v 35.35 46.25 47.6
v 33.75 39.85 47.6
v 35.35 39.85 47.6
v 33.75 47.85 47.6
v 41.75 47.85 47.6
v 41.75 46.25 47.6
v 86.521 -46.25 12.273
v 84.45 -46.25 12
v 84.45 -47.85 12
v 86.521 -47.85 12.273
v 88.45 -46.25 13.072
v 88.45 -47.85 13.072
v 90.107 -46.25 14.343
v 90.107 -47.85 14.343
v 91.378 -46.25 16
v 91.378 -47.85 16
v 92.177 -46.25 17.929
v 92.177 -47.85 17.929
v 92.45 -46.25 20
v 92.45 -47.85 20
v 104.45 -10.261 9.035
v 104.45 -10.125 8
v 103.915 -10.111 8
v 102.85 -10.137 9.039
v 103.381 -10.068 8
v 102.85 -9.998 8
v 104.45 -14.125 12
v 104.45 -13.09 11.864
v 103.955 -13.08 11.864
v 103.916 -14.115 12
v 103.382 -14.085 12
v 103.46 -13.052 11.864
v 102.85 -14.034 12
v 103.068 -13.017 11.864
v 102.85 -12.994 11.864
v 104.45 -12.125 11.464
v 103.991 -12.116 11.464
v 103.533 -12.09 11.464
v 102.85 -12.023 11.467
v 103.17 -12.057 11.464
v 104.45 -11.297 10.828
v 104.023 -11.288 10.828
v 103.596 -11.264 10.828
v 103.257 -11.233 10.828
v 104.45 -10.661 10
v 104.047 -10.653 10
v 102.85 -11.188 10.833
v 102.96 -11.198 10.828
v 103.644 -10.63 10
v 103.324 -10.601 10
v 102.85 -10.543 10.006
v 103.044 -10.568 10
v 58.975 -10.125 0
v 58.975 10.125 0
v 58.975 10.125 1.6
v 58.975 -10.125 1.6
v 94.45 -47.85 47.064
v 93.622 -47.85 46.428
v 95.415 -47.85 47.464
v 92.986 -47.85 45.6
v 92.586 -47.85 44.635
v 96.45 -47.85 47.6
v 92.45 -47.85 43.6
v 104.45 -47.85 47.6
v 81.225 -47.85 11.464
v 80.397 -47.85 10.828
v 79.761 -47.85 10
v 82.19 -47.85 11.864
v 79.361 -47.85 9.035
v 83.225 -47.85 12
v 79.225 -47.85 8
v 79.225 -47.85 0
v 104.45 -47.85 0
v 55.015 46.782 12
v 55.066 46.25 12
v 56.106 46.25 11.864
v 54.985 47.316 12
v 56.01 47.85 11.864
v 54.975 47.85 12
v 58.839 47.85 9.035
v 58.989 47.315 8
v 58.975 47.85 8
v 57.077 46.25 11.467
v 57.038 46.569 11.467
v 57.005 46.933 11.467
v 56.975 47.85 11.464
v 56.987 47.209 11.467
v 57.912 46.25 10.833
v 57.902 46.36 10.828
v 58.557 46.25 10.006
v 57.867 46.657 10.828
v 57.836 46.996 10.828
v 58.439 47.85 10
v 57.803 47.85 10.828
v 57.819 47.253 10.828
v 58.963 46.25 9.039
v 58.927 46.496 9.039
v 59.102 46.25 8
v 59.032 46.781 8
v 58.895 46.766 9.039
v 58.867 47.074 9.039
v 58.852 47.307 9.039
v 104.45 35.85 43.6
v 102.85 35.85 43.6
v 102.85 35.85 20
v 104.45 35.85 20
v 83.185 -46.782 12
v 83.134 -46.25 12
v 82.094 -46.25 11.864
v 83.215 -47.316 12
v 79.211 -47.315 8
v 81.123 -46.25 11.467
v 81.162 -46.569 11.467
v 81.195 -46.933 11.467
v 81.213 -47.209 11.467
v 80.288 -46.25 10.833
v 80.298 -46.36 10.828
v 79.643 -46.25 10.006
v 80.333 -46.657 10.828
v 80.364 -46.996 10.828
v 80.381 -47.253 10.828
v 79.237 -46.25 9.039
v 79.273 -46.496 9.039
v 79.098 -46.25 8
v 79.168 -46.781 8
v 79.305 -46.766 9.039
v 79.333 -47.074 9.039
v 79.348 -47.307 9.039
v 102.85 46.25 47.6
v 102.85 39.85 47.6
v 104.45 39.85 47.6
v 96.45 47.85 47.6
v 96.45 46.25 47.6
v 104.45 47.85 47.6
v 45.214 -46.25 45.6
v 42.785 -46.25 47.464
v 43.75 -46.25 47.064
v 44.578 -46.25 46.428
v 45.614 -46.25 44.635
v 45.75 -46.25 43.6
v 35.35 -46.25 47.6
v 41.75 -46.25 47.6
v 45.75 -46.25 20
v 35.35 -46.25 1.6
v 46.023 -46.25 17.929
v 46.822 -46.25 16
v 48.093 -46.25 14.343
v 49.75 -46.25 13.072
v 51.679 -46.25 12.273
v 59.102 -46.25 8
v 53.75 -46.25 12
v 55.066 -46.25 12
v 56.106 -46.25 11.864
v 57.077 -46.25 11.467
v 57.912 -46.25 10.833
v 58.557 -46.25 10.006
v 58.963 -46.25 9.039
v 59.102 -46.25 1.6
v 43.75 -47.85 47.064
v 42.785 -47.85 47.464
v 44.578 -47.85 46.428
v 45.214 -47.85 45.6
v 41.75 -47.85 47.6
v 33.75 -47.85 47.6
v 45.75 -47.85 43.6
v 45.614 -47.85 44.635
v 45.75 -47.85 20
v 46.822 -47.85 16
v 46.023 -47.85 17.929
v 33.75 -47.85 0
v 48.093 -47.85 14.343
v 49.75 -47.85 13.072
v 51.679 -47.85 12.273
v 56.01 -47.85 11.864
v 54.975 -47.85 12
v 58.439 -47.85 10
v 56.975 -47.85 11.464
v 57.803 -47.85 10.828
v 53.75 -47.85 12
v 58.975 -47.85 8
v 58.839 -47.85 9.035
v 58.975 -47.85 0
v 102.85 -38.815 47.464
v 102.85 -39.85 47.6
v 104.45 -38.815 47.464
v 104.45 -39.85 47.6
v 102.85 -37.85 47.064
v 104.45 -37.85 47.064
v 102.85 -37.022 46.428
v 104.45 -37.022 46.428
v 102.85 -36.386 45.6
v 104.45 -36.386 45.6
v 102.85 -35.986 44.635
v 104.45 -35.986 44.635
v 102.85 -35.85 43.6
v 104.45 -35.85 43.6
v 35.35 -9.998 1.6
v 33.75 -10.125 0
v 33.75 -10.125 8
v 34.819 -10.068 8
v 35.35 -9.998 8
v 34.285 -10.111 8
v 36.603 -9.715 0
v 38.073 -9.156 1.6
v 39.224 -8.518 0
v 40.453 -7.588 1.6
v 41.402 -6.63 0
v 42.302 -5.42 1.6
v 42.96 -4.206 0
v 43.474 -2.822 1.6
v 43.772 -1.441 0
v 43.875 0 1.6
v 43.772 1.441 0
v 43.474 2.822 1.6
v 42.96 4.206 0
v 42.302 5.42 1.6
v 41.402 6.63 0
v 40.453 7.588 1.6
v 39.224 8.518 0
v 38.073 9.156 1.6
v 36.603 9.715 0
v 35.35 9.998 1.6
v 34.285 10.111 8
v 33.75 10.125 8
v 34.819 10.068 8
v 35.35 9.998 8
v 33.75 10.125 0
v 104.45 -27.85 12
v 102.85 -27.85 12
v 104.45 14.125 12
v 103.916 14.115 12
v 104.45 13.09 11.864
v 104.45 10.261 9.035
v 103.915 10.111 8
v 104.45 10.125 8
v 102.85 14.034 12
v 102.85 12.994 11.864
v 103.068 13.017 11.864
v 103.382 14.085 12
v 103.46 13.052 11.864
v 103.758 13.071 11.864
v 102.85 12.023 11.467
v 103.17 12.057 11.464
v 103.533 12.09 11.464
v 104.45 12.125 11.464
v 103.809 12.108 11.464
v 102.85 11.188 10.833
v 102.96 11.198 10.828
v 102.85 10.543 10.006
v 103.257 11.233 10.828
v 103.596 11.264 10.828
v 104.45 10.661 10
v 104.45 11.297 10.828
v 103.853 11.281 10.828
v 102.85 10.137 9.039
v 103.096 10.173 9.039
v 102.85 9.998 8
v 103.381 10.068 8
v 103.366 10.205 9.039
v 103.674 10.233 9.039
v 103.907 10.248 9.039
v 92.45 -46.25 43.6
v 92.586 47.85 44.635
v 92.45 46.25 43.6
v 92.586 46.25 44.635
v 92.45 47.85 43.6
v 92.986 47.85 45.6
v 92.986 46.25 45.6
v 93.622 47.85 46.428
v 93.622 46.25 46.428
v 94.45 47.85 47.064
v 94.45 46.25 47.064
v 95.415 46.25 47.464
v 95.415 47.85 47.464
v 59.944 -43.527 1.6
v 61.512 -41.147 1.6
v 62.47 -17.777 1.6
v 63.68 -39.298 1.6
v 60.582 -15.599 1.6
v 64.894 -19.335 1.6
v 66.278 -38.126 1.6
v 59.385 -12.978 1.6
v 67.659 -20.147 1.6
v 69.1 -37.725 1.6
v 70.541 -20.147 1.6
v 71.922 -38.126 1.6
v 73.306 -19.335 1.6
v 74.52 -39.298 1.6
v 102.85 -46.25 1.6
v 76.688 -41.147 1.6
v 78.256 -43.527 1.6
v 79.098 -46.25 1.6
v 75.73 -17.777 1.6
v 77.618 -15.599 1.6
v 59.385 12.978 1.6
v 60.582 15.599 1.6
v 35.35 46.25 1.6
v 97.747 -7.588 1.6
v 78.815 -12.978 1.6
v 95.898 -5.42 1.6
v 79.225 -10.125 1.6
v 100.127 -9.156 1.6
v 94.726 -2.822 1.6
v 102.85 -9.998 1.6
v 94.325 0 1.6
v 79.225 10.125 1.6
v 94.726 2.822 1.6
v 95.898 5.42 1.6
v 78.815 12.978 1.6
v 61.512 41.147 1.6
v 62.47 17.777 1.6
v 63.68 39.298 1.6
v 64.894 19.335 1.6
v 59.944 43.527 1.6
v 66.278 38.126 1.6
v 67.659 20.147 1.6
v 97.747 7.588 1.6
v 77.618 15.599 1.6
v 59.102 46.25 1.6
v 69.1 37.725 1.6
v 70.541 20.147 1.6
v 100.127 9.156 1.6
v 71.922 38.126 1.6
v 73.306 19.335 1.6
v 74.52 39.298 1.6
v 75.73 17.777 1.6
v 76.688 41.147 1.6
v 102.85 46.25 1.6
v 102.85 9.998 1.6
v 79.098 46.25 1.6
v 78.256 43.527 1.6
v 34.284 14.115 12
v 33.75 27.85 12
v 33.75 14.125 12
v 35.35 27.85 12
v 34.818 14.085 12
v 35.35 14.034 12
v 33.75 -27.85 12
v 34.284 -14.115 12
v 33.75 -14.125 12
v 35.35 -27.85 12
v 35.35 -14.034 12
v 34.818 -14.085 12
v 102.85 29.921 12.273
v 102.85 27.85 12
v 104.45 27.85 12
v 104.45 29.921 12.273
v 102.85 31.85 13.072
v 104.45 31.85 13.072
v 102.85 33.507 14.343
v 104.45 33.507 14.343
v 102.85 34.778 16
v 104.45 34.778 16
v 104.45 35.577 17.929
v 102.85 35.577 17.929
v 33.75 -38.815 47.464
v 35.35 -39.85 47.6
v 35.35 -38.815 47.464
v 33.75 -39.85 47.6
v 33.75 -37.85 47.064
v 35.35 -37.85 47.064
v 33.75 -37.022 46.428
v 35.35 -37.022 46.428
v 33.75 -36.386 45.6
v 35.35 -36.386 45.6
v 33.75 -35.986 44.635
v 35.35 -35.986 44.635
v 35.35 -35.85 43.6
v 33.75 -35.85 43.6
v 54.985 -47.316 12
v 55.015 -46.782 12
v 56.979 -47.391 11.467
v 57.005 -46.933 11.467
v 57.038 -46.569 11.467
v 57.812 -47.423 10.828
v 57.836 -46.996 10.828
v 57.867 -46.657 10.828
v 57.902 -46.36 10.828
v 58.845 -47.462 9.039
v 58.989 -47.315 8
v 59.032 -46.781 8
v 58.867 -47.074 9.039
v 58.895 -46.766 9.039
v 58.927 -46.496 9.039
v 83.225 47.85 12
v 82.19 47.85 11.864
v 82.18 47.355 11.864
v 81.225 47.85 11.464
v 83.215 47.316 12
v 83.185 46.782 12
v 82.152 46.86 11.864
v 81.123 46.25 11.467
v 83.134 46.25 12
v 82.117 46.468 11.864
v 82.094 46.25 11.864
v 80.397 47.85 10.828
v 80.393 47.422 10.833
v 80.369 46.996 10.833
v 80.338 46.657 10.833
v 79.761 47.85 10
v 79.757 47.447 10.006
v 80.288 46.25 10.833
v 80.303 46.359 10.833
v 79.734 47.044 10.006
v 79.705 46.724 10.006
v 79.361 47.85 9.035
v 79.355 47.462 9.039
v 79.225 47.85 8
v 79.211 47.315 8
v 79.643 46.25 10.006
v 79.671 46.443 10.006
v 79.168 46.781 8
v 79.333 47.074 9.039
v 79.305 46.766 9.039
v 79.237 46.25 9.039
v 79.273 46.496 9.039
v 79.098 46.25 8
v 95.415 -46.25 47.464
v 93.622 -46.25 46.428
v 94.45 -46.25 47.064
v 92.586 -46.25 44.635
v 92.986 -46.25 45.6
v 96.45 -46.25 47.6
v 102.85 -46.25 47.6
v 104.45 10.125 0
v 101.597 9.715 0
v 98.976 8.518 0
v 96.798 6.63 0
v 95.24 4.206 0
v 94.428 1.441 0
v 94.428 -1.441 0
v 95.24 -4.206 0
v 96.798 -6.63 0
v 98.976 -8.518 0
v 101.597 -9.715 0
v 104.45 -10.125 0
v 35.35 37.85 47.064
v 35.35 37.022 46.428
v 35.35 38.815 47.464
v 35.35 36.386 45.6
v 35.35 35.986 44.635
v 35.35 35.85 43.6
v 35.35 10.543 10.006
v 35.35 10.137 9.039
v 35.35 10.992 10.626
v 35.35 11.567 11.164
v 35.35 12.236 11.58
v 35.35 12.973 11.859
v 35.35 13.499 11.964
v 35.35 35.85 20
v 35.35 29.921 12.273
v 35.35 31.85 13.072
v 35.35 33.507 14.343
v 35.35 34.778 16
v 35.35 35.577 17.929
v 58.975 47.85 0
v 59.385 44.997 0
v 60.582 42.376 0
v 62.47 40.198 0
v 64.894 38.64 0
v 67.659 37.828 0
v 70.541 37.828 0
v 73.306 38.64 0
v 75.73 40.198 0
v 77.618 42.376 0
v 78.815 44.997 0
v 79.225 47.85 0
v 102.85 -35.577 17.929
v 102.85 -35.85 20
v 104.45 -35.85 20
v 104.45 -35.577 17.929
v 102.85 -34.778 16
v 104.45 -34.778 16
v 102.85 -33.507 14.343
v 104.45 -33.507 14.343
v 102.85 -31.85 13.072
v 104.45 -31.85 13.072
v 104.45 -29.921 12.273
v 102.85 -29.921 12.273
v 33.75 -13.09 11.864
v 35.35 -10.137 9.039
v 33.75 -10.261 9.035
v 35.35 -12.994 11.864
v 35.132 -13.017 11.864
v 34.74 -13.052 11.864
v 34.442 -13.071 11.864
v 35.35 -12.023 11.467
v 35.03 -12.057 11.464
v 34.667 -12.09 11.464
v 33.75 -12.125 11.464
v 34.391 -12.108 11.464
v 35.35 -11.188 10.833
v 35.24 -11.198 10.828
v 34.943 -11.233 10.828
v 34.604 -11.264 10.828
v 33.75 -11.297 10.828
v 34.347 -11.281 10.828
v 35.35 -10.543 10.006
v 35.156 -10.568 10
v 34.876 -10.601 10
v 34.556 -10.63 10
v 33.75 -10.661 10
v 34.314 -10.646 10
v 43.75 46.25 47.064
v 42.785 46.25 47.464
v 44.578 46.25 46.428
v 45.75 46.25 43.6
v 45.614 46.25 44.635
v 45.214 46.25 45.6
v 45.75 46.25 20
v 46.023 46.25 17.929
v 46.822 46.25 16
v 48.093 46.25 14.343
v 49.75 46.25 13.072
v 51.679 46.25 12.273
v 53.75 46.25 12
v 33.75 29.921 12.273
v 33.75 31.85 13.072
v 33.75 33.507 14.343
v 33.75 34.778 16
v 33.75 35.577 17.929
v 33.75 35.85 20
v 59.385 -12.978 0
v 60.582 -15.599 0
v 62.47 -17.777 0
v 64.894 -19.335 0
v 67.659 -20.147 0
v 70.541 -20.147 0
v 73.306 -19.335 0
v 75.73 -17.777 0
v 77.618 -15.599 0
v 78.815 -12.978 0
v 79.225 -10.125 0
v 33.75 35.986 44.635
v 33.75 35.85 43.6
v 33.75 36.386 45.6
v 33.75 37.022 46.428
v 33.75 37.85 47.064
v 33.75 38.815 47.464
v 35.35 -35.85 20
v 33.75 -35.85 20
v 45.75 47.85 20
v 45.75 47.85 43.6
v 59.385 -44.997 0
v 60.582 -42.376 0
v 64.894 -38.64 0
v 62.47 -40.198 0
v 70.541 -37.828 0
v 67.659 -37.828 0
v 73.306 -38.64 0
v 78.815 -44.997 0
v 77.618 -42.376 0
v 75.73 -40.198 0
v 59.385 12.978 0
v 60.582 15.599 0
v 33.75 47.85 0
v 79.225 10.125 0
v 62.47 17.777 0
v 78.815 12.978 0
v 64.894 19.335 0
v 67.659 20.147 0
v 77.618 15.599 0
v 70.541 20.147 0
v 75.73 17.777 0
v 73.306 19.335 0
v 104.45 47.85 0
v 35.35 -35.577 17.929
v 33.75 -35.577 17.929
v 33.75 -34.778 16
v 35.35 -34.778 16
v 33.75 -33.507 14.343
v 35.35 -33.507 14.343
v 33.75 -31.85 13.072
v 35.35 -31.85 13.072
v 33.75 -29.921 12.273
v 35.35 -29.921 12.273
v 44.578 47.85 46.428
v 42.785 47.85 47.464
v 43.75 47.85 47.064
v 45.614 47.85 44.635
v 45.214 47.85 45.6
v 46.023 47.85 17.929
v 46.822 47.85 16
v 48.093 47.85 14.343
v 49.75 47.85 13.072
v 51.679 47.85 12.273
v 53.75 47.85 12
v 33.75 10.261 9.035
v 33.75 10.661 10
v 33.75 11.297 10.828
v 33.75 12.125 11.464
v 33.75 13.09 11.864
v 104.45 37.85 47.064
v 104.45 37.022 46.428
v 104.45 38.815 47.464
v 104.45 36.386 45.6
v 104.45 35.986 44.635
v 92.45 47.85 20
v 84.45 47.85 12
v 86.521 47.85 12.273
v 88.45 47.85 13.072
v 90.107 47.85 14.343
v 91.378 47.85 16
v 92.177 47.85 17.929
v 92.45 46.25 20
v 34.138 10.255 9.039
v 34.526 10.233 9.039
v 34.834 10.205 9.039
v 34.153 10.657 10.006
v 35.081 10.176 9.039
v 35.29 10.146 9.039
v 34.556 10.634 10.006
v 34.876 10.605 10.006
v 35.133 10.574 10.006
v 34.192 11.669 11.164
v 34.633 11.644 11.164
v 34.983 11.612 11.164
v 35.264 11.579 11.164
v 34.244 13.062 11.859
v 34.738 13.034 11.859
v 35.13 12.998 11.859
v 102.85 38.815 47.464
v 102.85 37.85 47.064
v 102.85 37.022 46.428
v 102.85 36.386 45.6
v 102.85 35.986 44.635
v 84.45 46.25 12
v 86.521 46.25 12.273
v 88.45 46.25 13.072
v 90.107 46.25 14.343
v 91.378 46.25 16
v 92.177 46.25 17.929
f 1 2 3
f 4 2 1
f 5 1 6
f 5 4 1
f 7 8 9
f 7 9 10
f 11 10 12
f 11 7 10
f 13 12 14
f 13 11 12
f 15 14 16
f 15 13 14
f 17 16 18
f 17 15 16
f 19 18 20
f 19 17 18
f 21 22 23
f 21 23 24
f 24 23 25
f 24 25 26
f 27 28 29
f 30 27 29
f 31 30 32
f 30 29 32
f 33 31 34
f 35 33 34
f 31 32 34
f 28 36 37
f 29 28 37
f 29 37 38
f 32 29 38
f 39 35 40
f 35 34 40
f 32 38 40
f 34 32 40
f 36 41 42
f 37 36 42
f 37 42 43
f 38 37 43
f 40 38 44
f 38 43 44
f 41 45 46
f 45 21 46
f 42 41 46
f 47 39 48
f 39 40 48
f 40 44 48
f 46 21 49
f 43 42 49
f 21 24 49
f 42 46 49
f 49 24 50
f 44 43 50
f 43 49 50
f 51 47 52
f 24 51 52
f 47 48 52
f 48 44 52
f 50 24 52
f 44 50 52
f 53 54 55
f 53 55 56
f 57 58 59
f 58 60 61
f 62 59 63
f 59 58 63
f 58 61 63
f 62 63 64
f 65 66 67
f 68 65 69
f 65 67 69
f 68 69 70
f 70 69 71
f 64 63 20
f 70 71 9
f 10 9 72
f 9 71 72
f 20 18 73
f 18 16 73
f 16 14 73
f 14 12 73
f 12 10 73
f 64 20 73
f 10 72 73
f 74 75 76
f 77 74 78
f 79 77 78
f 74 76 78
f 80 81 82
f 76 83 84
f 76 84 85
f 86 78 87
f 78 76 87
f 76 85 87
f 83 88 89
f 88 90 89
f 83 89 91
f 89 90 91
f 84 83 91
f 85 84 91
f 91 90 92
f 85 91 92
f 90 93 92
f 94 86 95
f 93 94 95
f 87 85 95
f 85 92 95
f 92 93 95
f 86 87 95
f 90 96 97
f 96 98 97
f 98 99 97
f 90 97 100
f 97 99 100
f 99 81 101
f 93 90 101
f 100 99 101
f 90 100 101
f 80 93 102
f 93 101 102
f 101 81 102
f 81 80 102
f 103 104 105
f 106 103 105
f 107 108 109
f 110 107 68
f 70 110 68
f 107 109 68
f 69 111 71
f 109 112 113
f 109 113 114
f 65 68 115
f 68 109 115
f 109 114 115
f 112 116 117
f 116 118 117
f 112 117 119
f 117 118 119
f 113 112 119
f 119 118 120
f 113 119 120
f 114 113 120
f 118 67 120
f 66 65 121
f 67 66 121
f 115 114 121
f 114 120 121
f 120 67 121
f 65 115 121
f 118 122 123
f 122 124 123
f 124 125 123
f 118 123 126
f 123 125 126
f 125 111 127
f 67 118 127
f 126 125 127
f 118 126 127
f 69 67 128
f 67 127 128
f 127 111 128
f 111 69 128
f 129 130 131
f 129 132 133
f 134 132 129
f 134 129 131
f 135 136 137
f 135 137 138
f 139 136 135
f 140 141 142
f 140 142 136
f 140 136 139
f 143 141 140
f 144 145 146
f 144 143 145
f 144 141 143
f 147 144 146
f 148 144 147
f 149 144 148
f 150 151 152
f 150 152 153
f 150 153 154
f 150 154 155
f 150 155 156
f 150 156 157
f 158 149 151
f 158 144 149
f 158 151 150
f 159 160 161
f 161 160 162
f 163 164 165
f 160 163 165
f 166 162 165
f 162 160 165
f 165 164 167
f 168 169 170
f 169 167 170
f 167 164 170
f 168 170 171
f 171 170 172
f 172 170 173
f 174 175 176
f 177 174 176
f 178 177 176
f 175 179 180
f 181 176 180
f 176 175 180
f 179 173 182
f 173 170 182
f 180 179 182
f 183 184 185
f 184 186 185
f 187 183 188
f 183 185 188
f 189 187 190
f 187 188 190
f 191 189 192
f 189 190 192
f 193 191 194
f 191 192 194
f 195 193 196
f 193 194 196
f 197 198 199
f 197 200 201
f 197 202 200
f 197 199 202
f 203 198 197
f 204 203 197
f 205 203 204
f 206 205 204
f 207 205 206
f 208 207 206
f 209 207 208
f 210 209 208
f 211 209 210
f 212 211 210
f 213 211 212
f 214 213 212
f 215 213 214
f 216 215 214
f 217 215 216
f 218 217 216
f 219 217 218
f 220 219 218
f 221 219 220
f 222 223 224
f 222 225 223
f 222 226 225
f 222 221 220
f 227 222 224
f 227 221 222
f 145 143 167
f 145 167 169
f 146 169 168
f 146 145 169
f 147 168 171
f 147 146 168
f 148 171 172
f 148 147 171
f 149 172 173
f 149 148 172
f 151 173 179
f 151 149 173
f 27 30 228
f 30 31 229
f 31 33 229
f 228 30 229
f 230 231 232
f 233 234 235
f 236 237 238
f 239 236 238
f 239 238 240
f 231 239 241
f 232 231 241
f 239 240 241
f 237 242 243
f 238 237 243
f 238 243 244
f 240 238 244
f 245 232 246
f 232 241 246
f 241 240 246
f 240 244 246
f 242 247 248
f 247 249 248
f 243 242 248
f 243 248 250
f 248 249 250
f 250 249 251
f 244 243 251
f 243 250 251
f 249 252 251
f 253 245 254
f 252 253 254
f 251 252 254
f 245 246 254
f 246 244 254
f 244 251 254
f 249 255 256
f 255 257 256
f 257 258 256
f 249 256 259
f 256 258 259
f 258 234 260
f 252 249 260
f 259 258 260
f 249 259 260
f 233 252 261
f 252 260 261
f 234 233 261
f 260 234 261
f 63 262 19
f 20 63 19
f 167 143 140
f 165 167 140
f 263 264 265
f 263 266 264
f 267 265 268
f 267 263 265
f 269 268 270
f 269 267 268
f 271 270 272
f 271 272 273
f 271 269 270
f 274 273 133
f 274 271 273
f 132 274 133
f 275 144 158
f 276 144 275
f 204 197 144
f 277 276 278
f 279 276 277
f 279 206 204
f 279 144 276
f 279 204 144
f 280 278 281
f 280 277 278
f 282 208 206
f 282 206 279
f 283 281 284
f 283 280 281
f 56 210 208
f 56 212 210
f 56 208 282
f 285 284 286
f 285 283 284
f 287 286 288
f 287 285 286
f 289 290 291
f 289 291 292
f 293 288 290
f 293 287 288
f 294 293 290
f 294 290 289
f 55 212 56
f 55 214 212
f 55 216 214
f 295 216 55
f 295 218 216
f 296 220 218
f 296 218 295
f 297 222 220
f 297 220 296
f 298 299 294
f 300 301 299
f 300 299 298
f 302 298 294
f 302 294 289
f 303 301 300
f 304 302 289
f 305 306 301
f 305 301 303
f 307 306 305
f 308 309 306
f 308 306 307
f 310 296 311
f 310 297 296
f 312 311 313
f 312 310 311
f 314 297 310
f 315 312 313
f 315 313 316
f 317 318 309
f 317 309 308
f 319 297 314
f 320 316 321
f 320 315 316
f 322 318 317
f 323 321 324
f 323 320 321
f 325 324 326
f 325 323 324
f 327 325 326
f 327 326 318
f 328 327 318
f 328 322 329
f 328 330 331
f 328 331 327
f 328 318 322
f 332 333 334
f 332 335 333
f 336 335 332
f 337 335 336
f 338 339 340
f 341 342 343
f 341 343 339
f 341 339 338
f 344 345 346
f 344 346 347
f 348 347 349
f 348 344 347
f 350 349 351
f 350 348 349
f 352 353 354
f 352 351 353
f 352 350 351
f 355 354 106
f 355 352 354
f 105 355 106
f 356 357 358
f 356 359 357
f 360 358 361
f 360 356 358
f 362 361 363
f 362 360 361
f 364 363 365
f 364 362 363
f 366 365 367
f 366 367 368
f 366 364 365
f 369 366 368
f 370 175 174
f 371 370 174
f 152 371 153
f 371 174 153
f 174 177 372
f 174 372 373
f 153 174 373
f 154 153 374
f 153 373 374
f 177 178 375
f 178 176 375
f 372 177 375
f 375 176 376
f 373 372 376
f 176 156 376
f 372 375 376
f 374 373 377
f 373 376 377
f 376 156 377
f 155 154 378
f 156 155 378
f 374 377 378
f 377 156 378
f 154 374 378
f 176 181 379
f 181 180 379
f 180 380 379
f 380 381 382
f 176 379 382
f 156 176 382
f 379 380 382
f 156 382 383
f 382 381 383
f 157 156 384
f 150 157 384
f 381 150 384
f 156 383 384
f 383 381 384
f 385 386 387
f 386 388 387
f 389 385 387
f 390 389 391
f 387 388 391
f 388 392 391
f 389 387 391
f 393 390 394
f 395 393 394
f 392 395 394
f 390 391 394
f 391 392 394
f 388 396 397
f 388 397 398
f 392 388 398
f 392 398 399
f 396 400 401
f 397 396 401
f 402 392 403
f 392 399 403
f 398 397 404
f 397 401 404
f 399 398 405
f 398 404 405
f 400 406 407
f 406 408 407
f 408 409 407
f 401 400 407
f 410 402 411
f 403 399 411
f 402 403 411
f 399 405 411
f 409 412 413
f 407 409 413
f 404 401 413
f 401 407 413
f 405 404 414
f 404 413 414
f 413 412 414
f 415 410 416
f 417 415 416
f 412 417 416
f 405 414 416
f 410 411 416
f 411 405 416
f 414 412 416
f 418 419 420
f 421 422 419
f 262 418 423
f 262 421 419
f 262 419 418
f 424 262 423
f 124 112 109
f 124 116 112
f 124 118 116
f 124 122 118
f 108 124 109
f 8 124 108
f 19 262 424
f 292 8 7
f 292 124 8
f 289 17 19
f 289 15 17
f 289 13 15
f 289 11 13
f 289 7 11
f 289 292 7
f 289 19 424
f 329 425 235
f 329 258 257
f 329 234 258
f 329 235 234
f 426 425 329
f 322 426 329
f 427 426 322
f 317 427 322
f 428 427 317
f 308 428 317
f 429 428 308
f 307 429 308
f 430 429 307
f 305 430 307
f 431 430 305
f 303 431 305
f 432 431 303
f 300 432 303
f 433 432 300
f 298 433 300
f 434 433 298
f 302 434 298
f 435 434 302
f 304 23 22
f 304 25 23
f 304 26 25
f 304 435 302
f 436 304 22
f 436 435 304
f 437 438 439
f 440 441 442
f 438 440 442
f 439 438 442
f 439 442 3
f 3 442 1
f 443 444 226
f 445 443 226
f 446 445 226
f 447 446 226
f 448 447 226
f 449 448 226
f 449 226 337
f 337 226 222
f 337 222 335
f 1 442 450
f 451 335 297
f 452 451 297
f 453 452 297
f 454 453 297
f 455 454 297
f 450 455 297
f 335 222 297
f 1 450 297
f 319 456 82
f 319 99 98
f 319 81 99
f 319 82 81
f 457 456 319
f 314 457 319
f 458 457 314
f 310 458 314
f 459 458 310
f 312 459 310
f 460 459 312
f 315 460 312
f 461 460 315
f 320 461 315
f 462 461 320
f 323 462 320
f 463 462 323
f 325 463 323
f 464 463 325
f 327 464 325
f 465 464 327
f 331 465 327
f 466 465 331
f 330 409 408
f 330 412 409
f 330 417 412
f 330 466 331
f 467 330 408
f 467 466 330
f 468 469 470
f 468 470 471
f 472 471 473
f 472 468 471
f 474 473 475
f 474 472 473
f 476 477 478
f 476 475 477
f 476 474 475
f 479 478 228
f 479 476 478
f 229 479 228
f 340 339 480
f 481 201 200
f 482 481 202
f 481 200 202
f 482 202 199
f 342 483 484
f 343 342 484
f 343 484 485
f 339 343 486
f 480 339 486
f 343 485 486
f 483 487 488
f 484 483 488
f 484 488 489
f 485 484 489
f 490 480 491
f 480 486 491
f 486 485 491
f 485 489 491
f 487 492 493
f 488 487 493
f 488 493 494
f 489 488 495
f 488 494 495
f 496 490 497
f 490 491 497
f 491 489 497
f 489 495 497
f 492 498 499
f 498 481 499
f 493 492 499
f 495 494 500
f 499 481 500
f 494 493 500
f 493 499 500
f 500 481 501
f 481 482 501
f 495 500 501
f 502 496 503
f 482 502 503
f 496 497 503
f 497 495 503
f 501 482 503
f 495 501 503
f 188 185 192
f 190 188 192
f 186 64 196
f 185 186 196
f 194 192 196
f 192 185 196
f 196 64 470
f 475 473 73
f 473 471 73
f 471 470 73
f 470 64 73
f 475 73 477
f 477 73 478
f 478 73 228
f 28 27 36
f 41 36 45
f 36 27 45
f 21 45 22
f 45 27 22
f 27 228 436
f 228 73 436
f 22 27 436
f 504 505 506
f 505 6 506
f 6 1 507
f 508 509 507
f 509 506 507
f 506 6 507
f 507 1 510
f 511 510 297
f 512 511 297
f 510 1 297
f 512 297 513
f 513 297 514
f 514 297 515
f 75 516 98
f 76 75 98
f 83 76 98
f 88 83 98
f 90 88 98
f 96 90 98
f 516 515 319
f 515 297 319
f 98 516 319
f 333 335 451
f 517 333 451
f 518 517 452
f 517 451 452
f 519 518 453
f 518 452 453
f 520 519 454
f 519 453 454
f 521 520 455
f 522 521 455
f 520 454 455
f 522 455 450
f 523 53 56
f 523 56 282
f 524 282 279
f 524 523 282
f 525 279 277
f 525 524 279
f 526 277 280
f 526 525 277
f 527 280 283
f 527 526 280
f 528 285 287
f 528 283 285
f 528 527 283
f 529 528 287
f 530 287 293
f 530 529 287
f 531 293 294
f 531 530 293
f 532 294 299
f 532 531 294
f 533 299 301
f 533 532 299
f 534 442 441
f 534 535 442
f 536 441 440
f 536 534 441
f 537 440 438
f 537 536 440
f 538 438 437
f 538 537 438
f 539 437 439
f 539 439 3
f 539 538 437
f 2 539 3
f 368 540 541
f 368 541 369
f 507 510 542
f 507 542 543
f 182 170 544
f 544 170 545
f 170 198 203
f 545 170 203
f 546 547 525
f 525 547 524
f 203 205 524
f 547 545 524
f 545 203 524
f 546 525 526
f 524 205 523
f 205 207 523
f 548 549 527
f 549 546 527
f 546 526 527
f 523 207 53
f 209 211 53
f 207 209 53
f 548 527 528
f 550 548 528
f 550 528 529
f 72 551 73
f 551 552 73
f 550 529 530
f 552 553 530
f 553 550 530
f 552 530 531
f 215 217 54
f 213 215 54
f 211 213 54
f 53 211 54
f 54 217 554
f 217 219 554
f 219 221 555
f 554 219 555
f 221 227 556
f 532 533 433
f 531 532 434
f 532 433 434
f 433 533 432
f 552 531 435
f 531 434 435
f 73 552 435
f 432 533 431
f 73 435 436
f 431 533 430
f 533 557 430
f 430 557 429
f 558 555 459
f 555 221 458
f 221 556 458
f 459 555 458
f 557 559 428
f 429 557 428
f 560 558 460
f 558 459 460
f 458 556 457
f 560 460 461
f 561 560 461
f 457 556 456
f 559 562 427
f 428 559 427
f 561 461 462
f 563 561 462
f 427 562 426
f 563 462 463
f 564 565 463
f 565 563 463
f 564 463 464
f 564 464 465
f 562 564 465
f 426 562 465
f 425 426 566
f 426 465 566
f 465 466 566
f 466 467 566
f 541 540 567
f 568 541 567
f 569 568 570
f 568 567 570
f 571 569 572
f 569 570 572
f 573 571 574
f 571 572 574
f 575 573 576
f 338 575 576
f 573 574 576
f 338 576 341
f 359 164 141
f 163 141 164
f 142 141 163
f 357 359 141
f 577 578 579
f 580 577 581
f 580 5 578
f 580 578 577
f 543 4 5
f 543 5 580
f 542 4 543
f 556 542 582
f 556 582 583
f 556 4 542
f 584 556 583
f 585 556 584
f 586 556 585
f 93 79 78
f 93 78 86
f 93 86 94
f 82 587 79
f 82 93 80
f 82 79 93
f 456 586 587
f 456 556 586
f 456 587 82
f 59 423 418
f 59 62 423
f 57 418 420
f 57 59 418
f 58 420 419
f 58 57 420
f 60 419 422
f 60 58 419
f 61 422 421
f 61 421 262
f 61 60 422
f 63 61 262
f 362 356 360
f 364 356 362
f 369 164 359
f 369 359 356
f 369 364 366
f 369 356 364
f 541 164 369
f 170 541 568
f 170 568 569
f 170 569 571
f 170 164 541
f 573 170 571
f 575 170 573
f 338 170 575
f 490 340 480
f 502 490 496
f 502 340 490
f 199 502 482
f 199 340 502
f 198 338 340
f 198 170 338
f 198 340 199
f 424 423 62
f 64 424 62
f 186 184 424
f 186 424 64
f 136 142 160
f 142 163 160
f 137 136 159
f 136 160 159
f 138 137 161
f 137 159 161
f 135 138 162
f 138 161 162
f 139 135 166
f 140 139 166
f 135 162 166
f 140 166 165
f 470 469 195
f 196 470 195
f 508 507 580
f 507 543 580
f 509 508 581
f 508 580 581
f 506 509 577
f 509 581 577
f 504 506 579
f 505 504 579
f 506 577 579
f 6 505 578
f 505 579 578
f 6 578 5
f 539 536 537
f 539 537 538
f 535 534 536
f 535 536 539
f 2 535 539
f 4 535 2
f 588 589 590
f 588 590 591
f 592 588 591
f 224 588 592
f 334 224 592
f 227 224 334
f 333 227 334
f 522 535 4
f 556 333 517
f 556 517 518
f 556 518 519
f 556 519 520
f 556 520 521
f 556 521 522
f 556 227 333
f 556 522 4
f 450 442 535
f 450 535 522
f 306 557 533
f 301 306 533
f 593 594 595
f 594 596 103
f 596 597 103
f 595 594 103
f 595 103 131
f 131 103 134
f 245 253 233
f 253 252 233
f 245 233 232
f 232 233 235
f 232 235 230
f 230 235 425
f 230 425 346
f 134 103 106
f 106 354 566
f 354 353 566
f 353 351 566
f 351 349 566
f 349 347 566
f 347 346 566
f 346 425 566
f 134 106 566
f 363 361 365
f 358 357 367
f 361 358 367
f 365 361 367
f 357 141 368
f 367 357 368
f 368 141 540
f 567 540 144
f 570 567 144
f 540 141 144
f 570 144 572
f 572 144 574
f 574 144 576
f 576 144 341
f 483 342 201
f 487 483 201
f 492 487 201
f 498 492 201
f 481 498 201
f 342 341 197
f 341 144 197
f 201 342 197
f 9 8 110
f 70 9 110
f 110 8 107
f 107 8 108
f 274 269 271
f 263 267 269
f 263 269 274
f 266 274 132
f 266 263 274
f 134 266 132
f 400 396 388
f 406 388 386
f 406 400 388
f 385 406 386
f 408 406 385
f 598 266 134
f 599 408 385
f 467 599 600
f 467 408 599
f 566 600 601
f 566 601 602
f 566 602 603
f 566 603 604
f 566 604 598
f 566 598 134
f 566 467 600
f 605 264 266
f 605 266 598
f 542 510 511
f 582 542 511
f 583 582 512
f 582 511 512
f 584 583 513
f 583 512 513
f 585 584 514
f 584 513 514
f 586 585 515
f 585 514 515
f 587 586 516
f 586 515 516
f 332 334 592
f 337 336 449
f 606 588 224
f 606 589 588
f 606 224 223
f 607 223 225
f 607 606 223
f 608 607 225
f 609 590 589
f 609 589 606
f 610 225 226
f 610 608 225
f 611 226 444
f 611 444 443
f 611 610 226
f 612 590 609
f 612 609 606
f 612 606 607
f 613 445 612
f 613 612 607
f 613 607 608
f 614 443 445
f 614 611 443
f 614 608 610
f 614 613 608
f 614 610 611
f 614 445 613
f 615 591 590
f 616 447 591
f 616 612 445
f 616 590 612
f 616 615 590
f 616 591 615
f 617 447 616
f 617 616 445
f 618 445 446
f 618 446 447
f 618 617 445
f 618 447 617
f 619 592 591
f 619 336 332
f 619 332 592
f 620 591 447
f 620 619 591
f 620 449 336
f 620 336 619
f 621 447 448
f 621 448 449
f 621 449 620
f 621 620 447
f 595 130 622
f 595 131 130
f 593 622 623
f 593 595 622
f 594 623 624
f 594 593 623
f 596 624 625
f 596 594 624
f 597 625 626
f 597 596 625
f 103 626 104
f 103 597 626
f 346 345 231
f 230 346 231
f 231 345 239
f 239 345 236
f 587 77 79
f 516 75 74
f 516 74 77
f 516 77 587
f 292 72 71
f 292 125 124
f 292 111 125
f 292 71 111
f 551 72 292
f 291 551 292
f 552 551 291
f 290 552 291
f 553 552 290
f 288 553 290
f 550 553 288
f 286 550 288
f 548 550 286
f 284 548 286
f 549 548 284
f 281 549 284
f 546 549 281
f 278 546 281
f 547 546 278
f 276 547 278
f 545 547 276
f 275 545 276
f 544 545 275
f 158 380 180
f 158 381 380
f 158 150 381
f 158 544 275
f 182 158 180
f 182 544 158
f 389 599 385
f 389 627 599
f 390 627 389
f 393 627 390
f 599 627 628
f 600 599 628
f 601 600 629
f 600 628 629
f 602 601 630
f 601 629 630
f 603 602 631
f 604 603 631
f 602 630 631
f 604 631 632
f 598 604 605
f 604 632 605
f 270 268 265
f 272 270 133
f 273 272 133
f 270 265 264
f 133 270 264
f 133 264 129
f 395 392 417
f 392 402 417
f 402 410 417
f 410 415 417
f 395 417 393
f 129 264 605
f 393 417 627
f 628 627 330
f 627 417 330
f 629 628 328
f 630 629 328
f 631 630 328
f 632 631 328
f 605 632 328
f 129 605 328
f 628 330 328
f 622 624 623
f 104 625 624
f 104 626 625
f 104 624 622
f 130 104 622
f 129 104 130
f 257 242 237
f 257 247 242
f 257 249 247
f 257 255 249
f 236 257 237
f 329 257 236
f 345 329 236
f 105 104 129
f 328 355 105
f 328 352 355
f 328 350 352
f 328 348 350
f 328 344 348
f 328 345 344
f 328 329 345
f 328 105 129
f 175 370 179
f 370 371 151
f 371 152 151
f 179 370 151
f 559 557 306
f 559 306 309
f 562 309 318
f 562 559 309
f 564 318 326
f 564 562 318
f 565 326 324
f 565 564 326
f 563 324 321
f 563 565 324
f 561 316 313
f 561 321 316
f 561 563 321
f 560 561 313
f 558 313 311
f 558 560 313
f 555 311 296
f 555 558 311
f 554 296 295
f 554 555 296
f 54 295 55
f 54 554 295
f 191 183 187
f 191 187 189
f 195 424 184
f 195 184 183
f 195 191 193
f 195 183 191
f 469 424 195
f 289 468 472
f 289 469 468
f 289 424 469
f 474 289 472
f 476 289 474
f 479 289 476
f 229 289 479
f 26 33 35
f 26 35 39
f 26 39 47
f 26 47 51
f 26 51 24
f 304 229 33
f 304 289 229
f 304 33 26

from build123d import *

# Parameters (mm, degrees)
SKETCH031_W          = 70.7
SKETCH031_H          = 95.7
PAD016_DEPTH         = 47.6
THICKNESS016_T       = -1.6
POCKET015_DEPTH      = 47.851
POCKET015_DEPTH_BACK = 47.851
POCKET016_DEPTH      = 35.351
POCKET016_DEPTH_BACK = 35.351
SKETCH034_R          = 10.125
POCKET017_DEPTH      = 0.001
POCKET017_DEPTH_BACK = 47.601
FILLET002_R          = 4


with BuildPart() as part:
    # Sketch031 → Pad016 (new body)
    with BuildSketch(Plane.XY):
        Rectangle(SKETCH031_W, SKETCH031_H)
    extrude(amount=PAD016_DEPTH)

    # Thickness016
    thickness016_openings = [part.faces().sort_by_distance(p)[0] for p in [
        (0, 0, 47.6),
    ]]
    offset(amount=THICKNESS016_T, openings=thickness016_openings, kind=Kind.INTERSECTION)

    # Sketch032 → Pocket015 (cut, two sides)
    with BuildSketch(Plane.XZ) as pocket015_sk:
        with BuildLine():
            Line((-23.35, 47.6), (23.35, 47.6))
            Line((23.35, 47.6), (23.35, 20))
            ThreePointArc((15.35, 12), (21.006854, 14.343146), (23.35, 20))
            Line((15.35, 12), (-15.35, 12))
            ThreePointArc((-23.35, 20), (-21.006854, 14.343146), (-15.35, 12))
            Line((-23.35, 20), (-23.35, 47.6))
        make_face()
    extrude(amount=-POCKET015_DEPTH, mode=Mode.SUBTRACT)
    extrude(pocket015_sk.sketch, amount=POCKET015_DEPTH_BACK, mode=Mode.SUBTRACT)

    # Sketch033 → Pocket016 (cut, two sides)
    with BuildSketch(Plane.YZ) as pocket016_sk:
        with BuildLine():
            Line((-35.85, 47.6), (35.85, 47.6))
            Line((35.85, 47.6), (35.85, 20))
            ThreePointArc((27.85, 12), (33.506854, 14.343146), (35.85, 20))
            Line((27.85, 12), (-27.85, 12))
            ThreePointArc((-35.85, 20), (-33.506854, 14.343146), (-27.85, 12))
            Line((-35.85, 20), (-35.85, 47.6))
        make_face()
    extrude(amount=-POCKET016_DEPTH, mode=Mode.SUBTRACT)
    extrude(pocket016_sk.sketch, amount=POCKET016_DEPTH_BACK, mode=Mode.SUBTRACT)

    # Sketch034 → Pocket017 (cut, two sides)
    with BuildSketch(Plane.XY) as pocket017_sk:
        with Locations((0, 47.85)):
            Circle(SKETCH034_R)
        with Locations((0, -47.85)):
            Circle(SKETCH034_R)
        with Locations((35.35, 0)):
            Circle(SKETCH034_R)
        with Locations((-35.35, 0)):
            Circle(SKETCH034_R)
        with BuildLine():
            ThreePointArc((10.125, 10.125), (0, 20.25), (-10.125, 10.125))
            Line((-10.125, 10.125), (-10.125, -10.125))
            ThreePointArc((-10.125, -10.125), (0, -20.25), (10.125, -10.125))
            Line((10.125, 10.125), (10.125, -10.125))
        make_face()
    extrude(amount=-POCKET017_DEPTH, mode=Mode.SUBTRACT)
    extrude(pocket017_sk.sketch, amount=POCKET017_DEPTH_BACK, mode=Mode.SUBTRACT)

    # Fillet002
    fillet002_edges = [part.edges().sort_by_distance(p)[0] for p in [
        (34.547475, -10.093145, 12),
        (34.547475, 10.093145, 12),
        (34.55, 35.85, 47.6),
        (23.35, 47.05, 47.6),
        (10.093145, 47.047475, 12),
        (-10.093145, 47.047475, 12),
        (-23.35, 47.05, 47.6),
        (-34.55, 35.85, 47.6),
        (-34.547475, 10.093145, 12),
        (-34.547475, -10.093145, 12),
        (-34.55, -35.85, 47.6),
        (-23.35, -47.05, 47.6),
        (-10.093145, -47.047475, 12),
        (10.093145, -47.047475, 12),
        (23.35, -47.05, 47.6),
        (34.55, -35.85, 47.6),
    ]]
    fillet(fillet002_edges, radius=FILLET002_R)


with BuildPart() as part_1:
    # Body016 placement: moved
    add(part.part.moved(Location((69.1, 0, 0))))


solid = part_1.part
